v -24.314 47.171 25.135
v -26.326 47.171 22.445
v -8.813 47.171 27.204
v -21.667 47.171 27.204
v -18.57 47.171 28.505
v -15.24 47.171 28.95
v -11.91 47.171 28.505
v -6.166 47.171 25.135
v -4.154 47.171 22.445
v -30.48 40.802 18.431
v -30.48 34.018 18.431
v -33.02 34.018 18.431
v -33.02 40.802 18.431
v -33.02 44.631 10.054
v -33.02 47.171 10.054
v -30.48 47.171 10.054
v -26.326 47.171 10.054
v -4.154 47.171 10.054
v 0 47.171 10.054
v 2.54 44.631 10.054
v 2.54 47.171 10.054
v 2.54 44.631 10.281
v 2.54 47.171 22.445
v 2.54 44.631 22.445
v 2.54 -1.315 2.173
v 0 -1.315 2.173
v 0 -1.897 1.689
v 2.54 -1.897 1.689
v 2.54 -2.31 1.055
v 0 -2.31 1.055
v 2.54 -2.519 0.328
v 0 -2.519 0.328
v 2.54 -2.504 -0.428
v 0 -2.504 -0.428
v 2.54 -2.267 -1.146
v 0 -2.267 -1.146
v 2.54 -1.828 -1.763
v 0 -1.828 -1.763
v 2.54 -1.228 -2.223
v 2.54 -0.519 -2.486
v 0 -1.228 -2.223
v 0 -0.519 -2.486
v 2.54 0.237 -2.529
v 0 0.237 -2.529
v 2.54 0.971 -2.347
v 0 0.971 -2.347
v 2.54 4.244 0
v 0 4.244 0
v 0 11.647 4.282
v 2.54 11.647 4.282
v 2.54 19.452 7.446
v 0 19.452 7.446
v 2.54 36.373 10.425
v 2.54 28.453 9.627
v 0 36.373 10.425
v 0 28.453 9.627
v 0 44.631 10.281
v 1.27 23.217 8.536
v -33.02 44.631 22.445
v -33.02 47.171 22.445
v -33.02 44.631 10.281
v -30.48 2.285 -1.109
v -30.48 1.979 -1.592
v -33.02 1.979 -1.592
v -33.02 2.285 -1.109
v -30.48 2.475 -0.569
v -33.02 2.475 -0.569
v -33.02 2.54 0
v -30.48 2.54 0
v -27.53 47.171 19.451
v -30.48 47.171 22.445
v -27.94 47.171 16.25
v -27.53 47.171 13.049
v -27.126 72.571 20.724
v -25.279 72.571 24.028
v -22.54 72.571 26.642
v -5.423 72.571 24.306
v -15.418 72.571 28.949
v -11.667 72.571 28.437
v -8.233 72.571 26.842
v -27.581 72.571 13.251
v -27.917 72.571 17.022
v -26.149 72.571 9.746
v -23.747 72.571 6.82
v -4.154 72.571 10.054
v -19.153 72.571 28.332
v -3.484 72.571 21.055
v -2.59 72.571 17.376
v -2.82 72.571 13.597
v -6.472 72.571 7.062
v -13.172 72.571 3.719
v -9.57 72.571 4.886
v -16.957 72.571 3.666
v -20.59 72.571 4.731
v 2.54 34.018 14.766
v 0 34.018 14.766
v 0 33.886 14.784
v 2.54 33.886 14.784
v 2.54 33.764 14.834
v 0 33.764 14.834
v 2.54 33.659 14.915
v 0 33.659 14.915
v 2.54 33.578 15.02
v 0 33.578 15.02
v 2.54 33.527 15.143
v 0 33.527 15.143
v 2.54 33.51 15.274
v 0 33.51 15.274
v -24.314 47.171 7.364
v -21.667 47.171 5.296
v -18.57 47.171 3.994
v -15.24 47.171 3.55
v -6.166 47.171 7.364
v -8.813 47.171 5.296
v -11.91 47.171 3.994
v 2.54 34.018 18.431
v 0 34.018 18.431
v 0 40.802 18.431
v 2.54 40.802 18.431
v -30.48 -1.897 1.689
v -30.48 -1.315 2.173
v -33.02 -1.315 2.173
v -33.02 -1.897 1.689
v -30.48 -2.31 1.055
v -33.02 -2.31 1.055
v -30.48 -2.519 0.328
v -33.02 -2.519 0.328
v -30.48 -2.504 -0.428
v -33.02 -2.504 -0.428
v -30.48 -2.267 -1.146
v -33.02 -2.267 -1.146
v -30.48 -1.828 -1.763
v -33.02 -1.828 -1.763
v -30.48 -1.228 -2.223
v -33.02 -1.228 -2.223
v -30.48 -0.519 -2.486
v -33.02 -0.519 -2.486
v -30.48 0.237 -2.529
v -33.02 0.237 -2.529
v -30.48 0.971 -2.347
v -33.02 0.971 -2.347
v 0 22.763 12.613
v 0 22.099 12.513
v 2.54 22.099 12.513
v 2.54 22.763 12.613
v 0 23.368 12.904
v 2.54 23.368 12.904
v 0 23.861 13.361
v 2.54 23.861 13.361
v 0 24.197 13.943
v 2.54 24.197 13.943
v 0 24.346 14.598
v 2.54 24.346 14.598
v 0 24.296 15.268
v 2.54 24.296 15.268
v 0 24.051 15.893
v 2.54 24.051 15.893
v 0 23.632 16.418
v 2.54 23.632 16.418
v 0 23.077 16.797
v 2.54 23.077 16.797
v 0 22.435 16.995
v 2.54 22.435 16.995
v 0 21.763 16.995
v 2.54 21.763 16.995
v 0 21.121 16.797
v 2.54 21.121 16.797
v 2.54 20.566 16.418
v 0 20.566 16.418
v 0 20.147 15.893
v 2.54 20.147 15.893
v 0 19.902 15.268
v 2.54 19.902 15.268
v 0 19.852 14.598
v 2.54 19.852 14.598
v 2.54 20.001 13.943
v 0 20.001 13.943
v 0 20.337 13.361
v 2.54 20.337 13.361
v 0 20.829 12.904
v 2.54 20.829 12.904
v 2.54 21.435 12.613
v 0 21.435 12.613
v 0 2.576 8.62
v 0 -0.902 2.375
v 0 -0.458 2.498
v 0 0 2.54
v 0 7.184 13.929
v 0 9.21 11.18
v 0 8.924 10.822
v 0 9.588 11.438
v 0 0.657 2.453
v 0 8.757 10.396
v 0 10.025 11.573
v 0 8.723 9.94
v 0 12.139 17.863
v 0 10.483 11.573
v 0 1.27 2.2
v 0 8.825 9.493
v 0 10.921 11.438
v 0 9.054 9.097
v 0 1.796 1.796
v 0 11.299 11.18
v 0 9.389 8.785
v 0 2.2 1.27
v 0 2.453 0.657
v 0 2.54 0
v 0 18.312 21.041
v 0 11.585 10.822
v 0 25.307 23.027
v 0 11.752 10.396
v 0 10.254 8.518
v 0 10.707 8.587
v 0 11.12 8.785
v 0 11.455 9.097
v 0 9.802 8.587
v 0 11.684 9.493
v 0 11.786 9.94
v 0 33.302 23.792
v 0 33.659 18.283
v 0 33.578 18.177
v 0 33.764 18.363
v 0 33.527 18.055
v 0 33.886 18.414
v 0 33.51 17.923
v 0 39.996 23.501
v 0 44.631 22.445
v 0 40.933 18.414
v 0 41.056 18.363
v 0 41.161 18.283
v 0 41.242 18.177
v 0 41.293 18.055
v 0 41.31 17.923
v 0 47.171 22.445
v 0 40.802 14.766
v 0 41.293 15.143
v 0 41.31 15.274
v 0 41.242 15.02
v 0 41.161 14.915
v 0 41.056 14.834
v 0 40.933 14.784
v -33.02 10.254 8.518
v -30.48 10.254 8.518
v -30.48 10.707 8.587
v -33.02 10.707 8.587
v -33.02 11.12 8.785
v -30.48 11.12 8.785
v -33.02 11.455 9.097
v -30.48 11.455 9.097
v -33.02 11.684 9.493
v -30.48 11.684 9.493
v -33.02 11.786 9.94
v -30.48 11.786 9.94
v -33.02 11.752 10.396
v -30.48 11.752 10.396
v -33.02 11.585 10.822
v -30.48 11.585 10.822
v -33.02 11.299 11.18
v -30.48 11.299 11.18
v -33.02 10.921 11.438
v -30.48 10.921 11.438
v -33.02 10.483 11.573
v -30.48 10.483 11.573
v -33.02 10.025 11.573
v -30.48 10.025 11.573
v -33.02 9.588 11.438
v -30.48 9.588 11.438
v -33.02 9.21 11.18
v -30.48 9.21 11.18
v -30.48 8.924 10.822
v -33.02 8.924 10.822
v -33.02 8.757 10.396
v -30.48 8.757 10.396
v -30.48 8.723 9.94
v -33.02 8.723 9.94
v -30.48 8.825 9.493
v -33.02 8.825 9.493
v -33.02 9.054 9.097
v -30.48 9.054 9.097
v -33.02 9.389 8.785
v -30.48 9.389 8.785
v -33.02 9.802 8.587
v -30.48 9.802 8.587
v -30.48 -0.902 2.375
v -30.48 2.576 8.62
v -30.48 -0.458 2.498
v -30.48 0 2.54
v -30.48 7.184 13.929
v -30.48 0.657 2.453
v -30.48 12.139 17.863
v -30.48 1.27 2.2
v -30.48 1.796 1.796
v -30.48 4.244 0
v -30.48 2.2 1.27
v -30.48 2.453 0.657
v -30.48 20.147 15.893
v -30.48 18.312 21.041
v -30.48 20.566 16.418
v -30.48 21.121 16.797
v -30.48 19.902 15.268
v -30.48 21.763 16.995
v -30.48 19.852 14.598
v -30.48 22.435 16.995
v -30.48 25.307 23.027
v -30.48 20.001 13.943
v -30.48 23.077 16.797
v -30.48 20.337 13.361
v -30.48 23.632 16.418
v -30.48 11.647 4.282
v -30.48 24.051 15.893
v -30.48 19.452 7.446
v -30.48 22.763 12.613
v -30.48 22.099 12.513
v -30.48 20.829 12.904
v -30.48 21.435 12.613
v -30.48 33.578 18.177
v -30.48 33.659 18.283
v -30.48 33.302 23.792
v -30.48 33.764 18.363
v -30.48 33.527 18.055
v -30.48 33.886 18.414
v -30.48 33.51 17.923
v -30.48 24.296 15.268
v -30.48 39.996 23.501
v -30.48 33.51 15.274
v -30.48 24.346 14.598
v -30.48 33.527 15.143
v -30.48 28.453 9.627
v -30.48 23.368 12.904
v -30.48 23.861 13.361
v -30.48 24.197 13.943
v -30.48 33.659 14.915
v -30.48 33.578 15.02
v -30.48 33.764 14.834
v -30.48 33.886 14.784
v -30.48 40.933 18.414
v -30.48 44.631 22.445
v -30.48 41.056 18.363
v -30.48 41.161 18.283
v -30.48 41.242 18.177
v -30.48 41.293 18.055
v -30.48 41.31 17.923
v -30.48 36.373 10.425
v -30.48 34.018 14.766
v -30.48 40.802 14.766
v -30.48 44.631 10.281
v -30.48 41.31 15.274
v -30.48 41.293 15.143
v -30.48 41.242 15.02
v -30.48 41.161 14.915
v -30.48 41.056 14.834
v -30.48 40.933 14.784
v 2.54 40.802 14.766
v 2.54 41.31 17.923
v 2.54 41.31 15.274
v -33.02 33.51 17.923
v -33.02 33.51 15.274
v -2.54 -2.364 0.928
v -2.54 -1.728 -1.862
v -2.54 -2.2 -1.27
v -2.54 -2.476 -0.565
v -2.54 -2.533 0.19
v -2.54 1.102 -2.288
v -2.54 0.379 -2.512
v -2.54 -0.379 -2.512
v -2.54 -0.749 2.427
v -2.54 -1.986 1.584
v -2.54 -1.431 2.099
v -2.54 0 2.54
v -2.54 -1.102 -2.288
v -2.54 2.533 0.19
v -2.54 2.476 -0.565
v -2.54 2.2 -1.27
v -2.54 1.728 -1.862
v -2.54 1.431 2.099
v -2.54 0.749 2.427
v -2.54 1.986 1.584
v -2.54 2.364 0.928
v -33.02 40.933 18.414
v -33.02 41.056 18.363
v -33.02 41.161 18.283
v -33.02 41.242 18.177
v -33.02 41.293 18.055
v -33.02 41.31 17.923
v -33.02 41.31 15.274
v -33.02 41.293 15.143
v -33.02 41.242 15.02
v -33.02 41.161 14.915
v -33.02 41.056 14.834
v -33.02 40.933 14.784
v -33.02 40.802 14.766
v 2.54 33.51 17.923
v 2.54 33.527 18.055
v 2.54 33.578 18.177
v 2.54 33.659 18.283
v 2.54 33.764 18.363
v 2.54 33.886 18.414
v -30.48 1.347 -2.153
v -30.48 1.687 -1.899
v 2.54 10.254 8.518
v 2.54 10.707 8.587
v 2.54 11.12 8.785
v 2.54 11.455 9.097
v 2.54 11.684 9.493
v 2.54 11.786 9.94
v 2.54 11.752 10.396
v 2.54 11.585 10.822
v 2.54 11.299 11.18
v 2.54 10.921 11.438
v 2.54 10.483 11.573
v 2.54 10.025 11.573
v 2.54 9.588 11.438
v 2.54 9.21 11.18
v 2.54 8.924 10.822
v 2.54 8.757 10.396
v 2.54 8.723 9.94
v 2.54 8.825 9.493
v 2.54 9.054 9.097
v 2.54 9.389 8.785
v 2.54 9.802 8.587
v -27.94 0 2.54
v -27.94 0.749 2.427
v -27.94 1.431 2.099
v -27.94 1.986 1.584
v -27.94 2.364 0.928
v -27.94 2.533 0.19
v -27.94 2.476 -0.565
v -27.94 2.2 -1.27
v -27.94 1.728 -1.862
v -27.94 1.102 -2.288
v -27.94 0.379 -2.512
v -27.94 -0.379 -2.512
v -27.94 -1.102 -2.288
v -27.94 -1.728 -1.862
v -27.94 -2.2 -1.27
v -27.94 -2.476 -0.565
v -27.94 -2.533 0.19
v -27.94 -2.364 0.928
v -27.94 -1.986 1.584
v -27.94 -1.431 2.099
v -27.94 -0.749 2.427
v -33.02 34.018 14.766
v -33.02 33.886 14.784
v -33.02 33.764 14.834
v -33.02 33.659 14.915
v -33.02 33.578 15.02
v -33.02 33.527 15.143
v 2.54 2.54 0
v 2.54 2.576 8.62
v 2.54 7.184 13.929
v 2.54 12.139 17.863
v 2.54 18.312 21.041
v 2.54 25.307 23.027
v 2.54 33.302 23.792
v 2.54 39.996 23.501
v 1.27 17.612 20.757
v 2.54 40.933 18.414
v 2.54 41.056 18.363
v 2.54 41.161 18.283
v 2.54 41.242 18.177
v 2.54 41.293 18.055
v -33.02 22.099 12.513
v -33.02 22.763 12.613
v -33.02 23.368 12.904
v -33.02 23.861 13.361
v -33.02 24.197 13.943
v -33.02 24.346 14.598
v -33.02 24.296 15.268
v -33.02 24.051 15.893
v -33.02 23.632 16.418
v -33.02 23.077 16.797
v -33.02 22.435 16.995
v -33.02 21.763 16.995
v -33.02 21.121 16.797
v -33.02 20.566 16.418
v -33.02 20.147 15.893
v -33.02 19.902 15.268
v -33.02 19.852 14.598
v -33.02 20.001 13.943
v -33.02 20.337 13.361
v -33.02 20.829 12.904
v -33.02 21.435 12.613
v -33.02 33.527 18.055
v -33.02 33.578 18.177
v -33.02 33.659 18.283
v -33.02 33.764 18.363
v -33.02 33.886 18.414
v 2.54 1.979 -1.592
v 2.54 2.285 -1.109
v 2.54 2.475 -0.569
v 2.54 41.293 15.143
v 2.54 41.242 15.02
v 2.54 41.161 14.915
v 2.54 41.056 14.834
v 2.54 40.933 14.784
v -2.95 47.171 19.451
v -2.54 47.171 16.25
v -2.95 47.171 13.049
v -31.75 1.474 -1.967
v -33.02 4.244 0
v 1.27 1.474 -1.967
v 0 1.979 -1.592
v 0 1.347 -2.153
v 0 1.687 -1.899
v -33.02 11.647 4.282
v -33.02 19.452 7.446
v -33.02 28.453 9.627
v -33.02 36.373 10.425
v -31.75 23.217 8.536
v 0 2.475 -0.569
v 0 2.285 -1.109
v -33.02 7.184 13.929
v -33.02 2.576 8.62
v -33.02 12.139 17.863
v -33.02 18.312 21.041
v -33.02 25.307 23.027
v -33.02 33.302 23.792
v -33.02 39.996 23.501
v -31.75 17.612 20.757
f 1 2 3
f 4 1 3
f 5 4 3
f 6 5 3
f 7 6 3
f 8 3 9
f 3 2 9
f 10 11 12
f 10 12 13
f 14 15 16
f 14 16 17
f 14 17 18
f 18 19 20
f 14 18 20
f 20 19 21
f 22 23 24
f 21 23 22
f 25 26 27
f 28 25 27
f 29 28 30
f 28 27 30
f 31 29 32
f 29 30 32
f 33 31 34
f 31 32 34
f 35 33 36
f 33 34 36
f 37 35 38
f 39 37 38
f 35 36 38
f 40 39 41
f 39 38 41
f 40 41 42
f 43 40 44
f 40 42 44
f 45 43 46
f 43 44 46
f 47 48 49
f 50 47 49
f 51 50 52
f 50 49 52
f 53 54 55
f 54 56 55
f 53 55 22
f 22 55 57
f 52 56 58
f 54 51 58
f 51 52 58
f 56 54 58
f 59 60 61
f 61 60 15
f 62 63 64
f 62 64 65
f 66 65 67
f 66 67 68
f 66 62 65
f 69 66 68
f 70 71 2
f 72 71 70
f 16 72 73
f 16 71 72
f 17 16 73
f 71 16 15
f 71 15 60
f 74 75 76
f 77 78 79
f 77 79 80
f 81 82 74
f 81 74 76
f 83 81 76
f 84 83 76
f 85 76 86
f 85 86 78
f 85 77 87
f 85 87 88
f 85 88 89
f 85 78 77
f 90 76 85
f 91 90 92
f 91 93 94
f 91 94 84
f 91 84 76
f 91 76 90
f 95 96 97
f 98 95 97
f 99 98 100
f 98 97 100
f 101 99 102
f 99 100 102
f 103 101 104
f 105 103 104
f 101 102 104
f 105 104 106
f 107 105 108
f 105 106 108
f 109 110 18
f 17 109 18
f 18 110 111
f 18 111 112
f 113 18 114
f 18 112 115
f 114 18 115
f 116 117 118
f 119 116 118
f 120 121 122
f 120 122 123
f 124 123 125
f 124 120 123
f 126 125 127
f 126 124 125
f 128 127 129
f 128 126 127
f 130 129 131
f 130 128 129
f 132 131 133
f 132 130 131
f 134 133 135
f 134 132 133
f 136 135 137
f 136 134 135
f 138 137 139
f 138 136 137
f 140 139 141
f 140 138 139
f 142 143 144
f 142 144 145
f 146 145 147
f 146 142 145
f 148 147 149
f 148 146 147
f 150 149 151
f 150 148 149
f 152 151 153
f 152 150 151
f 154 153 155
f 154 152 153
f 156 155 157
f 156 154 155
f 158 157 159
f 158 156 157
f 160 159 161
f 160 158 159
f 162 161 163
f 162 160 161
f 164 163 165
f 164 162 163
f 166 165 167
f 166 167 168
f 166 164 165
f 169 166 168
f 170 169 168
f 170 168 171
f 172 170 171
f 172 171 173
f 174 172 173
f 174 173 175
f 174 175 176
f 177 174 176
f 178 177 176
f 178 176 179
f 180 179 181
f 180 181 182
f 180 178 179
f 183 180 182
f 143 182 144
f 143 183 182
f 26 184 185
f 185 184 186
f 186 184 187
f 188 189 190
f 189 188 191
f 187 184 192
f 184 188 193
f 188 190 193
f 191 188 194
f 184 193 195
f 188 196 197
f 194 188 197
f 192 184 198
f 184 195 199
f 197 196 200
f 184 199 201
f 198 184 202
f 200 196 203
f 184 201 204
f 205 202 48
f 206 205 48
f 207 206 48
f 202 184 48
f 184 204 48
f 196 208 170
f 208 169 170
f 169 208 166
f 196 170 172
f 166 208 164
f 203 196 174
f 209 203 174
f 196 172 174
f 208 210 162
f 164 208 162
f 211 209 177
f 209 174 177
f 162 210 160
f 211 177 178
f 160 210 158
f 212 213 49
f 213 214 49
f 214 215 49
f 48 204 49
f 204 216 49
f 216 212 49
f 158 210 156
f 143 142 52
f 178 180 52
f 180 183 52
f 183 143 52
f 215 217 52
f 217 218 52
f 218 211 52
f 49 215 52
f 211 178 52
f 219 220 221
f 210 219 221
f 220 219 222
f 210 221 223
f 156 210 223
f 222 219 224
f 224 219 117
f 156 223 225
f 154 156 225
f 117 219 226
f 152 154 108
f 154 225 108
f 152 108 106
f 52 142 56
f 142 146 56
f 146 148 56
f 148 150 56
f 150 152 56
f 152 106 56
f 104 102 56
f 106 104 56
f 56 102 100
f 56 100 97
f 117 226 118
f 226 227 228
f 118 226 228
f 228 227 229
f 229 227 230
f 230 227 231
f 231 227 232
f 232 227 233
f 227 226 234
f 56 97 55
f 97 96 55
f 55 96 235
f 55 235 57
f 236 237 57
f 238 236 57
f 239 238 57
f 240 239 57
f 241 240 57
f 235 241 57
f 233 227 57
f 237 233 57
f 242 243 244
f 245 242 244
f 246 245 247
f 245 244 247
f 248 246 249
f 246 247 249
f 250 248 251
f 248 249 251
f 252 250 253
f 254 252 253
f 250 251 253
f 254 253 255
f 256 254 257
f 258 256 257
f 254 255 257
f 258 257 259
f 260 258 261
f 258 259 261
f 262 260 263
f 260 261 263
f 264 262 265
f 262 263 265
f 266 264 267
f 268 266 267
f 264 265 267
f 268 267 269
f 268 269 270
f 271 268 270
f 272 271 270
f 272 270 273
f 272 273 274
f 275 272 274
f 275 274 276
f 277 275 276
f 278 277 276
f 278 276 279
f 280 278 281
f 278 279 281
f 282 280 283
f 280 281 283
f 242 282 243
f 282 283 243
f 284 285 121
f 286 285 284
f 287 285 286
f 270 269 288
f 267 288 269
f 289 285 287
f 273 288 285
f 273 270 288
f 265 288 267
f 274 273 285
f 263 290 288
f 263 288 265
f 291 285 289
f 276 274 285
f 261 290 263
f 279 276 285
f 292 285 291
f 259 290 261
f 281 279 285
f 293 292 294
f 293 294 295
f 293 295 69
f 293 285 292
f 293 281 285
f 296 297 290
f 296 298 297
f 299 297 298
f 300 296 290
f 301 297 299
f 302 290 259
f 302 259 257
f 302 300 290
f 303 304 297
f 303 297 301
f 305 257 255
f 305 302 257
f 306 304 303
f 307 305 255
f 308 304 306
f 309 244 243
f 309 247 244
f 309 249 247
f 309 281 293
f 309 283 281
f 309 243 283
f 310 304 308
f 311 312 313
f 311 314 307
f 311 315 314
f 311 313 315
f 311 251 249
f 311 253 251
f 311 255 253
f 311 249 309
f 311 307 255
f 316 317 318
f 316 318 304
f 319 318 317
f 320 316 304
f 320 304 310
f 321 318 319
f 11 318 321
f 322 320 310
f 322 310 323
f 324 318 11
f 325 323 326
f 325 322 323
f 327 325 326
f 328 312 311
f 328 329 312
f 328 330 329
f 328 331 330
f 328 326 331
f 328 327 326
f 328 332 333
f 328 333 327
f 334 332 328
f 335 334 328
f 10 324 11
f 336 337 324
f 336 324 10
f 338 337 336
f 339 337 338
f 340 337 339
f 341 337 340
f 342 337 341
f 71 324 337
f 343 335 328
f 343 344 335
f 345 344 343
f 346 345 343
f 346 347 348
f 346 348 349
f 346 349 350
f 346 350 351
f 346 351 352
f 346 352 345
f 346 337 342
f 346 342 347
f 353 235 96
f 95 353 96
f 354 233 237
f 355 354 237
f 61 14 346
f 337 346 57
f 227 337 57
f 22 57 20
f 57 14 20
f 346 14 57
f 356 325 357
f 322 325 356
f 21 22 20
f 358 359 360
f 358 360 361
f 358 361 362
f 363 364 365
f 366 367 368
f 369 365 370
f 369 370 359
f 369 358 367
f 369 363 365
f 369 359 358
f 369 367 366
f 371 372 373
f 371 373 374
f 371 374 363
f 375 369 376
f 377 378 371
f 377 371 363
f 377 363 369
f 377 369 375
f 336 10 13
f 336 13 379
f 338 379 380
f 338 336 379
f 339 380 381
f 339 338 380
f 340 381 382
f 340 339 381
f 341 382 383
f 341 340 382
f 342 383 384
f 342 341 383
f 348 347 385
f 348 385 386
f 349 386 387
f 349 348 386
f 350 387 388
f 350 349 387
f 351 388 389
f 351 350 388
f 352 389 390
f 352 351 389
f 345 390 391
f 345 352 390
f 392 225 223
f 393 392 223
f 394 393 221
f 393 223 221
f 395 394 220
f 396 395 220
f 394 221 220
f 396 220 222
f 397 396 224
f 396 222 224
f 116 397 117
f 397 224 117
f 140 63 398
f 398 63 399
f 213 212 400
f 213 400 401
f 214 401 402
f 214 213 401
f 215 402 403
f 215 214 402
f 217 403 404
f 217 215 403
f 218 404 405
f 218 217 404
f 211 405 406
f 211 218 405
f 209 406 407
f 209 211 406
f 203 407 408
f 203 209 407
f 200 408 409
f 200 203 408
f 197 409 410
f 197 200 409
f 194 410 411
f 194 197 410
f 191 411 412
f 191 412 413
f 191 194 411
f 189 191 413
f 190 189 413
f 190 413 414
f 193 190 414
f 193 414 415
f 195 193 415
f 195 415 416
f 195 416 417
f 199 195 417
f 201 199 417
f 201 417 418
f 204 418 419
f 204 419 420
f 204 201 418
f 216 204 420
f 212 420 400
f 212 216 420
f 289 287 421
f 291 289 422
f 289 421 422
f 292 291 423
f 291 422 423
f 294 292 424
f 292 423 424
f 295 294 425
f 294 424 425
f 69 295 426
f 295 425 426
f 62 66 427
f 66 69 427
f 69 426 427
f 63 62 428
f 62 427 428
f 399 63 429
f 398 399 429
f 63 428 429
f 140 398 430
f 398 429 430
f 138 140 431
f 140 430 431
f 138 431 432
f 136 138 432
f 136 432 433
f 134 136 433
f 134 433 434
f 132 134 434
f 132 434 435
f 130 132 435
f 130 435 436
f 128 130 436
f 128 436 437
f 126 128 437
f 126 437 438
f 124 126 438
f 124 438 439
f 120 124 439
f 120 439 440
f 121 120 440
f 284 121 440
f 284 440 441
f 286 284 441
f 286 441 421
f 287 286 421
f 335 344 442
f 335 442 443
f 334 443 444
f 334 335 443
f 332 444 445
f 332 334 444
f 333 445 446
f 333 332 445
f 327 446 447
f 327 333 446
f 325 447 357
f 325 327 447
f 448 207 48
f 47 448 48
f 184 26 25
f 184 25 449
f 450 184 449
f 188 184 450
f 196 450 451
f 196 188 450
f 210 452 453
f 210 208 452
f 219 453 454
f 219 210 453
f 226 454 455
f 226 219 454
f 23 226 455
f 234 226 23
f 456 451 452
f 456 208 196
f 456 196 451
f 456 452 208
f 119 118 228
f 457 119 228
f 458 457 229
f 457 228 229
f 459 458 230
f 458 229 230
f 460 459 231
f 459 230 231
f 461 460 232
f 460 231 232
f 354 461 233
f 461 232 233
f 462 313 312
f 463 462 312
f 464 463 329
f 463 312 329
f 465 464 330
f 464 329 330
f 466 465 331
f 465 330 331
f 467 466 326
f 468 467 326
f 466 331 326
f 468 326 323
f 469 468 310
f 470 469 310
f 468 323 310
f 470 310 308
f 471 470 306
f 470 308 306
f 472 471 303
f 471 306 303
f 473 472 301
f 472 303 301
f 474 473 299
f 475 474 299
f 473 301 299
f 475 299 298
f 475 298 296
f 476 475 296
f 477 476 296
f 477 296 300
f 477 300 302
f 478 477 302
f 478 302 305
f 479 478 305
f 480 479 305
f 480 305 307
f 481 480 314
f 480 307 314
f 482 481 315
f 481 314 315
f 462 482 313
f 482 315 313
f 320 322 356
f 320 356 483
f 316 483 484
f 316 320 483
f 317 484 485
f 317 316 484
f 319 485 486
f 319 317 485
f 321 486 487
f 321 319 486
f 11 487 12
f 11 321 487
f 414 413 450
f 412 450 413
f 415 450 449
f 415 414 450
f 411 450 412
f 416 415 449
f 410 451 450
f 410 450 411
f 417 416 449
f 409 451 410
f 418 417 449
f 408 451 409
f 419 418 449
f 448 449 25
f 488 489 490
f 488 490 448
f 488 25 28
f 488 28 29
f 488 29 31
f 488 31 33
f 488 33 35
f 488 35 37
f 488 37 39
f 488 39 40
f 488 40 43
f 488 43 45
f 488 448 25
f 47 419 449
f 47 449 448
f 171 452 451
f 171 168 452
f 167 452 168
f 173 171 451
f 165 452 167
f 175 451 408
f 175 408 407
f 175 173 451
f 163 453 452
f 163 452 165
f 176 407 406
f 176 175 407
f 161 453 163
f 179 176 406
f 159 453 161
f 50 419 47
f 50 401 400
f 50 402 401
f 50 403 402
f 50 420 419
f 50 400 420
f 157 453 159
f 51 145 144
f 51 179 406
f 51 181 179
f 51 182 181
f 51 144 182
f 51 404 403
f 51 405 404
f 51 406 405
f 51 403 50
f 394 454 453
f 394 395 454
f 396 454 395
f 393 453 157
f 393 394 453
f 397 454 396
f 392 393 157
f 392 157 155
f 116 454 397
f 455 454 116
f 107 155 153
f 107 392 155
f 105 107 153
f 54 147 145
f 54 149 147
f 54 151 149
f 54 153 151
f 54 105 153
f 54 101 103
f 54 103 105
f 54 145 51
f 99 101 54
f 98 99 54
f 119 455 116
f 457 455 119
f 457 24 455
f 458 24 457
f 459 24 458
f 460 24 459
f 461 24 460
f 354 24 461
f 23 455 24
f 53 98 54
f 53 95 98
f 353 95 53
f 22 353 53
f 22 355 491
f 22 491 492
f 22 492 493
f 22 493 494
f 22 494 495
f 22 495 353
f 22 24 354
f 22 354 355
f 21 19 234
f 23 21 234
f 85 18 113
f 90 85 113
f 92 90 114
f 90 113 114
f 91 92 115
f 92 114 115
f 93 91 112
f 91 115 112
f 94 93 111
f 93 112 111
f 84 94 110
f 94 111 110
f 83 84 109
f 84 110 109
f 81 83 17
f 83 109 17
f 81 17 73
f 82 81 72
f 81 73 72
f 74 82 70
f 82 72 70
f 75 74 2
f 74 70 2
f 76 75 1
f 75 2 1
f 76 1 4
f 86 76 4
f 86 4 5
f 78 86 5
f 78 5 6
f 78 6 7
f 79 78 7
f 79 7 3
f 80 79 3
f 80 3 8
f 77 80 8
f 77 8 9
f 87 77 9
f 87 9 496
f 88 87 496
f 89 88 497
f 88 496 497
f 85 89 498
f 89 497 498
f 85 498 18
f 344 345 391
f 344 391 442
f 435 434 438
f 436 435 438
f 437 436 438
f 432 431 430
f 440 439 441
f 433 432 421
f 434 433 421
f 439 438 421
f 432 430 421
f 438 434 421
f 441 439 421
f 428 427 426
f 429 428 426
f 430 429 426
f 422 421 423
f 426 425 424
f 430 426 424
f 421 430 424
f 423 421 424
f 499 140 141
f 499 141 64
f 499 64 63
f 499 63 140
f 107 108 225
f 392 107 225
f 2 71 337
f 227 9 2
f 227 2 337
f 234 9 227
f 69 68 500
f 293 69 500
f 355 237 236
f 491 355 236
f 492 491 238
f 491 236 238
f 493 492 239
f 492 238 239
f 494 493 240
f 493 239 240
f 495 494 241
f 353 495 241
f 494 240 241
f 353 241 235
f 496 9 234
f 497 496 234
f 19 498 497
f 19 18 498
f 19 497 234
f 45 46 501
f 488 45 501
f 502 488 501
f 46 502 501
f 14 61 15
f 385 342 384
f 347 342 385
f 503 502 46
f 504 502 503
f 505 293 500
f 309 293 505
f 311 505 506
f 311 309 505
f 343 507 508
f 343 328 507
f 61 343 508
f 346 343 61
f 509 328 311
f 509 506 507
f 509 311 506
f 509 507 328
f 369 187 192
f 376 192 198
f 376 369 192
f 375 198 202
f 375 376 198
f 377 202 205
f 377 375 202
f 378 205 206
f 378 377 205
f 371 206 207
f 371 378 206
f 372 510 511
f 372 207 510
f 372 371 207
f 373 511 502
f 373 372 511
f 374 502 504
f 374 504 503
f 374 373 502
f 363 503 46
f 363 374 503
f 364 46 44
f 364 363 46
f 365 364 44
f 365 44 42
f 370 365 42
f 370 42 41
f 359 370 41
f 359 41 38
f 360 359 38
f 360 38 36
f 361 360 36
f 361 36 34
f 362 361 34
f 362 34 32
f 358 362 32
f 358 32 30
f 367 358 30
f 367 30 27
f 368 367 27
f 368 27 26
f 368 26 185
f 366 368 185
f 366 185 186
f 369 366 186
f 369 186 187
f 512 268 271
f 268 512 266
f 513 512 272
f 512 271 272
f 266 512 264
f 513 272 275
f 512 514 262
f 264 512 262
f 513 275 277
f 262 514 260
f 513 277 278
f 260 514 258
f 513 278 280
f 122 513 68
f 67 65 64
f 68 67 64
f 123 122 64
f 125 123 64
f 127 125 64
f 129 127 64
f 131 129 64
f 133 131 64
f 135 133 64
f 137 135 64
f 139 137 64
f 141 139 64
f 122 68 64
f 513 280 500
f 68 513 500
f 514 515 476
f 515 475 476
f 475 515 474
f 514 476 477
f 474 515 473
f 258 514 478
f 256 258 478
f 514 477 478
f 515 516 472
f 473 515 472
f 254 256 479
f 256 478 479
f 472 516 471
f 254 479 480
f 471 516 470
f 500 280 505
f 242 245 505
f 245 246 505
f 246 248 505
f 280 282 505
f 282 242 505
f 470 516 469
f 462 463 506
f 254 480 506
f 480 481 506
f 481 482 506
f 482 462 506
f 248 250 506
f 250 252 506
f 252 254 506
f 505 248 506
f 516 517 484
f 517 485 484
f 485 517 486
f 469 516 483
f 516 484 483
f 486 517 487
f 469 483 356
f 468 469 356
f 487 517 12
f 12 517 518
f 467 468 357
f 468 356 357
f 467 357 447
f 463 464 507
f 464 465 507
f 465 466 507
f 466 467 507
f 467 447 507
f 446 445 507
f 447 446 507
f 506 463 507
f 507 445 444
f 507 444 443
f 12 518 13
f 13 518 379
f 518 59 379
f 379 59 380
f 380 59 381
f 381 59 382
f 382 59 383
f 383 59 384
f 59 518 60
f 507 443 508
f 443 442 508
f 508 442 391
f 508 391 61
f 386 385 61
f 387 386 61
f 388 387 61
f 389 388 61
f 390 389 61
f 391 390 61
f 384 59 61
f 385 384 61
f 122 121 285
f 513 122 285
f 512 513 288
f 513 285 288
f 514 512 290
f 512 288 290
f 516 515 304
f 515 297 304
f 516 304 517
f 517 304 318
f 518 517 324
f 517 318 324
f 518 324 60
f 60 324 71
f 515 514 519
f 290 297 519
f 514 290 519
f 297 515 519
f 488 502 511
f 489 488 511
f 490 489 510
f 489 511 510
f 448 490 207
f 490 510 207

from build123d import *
from build123d.topology import SkipClean

# Parameters (mm, degrees)
SKETCH1_R           = 2.253608868
SKETCH1_R_2         = 1.535947569
BOSS_EXTRUDE1_DEPTH = 2.54
BOSS_EXTRUDE2_START = 2.54
SKETCH2_R           = 2.54
BOSS_EXTRUDE2_DEPTH = 2.54
SKETCH3_W           = 35.56
SKETCH3_H           = 12.390840881
BOSS_EXTRUDE3_DEPTH = 2.54
SKETCH4_R           = 12.7
BOSS_EXTRUDE4_DEPTH = 25.4


with BuildPart() as part:
    # Sketch1 → Boss-Extrude1 (new body)
    with BuildSketch(Plane(origin=(0, 0, 0), x_dir=(0, 0, -1), z_dir=(1, 0, 0))):
        with BuildLine():
            ThreePointArc((1.592468268, 1.978798831), (0.844230706, 2.395594815), (0, 2.54))
            Line((0, 2.54), (0, 4.244163865))
            add(Edge.make_bspline(
                [(0, 4.244163865), (-12.597388044, 22.987058756), (-10.054393134, 47.171038997)],
                knots=[0.08126898, 0.08126898, 0.08126898, 1, 1, 1], degree=2))
            Line((-10.054393134, 47.171038997), (-22.445234015, 47.171038997))
            add(Edge.make_bspline(
                [(-2.172846137, -1.315423759), (-29.204965898, 12.296498459), (-22.445234015, 47.171038997)],
                knots=[0, 0, 0, 1, 1, 1], degree=2))
            ThreePointArc((-2.172846137, -1.315423759), (1.146442405, -2.266554613), (2.347146338, 0.970826488))
            add(Edge.make_bspline(
                [(2.347146338, 0.970826488), (1.964088335, 1.472757402), (1.592468268, 1.978798831)],
                knots=[0, 0, 0, 0.025251884, 0.025251884, 0.025251884], degree=2))
        make_face()
        with Locations((-14.766403047, 22.09885284)):
            Circle(SKETCH1_R, mode=Mode.SUBTRACT)
        with Locations((-10.054393134, 10.254408813)):
            Circle(SKETCH1_R_2, mode=Mode.SUBTRACT)
        with BuildLine():
            ThreePointArc((-18.431438628, 40.801963274), (-18.282648873, 41.161173519), (-17.923438628, 41.309963274))
            Line((-17.923438628, 41.309963274), (-15.274403047, 41.309963274))
            ThreePointArc((-15.274403047, 41.309963274), (-14.915192802, 41.161173519), (-14.766403047, 40.801963274))
            Line((-14.766403047, 40.801963274), (-14.766403047, 34.017963549))
            ThreePointArc((-14.766403047, 34.017963549), (-14.915192802, 33.658753304), (-15.274403047, 33.509963549))
            Line((-15.274403047, 33.509963549), (-17.923438628, 33.509963549))
            ThreePointArc((-17.923438628, 33.509963549), (-18.282648873, 33.658753304), (-18.431438628, 34.017963549))
            Line((-18.431438628, 34.017963549), (-18.431438628, 40.801963274))
        make_face(mode=Mode.SUBTRACT)
    extrude(amount=BOSS_EXTRUDE1_DEPTH)

    # Sketch2 → Boss-Extrude2 (add)
    with SkipClean():  # the faces are left unmerged after this step: merging them gives an invalid solid
        with BuildSketch(Plane.ZY.offset(BOSS_EXTRUDE2_START)):
            Circle(SKETCH2_R)
        extrude(amount=-BOSS_EXTRUDE2_DEPTH)


with BuildPart() as body_2:
    # Mirror2: mirrored copy
    add(part.part.mirror(Plane.ZY.offset(15.24)))


with BuildPart() as part_1:
    with SkipClean():  # the faces are left unmerged after this step: merging them gives an invalid solid
        add(part.part)

        add(body_2.part)  # Boss-Extrude3 merges body 2
        # Sketch3 → Boss-Extrude3 (add)
        with BuildSketch(Plane(origin=(0, 47.171038997, 0), x_dir=(1, 0, 0), z_dir=(0, 1, 0))):
            with Locations((-15.24, -16.249813575)):
                Rectangle(SKETCH3_W, SKETCH3_H)
        extrude(amount=-BOSS_EXTRUDE3_DEPTH)

    # Sketch4 → Boss-Extrude4 (add)
    with SkipClean():  # the faces are left unmerged after this step: merging them gives an invalid solid
        with BuildSketch(Plane(origin=(0, 47.171038997, 0), x_dir=(1, 0, 0), z_dir=(0, 1, 0))):
            with Locations(Location((-15.24, -16.249813574, 0), (0, 0, 29.197947033))):
                Circle(SKETCH4_R)
        extrude(amount=BOSS_EXTRUDE4_DEPTH)


solid = part_1.part
